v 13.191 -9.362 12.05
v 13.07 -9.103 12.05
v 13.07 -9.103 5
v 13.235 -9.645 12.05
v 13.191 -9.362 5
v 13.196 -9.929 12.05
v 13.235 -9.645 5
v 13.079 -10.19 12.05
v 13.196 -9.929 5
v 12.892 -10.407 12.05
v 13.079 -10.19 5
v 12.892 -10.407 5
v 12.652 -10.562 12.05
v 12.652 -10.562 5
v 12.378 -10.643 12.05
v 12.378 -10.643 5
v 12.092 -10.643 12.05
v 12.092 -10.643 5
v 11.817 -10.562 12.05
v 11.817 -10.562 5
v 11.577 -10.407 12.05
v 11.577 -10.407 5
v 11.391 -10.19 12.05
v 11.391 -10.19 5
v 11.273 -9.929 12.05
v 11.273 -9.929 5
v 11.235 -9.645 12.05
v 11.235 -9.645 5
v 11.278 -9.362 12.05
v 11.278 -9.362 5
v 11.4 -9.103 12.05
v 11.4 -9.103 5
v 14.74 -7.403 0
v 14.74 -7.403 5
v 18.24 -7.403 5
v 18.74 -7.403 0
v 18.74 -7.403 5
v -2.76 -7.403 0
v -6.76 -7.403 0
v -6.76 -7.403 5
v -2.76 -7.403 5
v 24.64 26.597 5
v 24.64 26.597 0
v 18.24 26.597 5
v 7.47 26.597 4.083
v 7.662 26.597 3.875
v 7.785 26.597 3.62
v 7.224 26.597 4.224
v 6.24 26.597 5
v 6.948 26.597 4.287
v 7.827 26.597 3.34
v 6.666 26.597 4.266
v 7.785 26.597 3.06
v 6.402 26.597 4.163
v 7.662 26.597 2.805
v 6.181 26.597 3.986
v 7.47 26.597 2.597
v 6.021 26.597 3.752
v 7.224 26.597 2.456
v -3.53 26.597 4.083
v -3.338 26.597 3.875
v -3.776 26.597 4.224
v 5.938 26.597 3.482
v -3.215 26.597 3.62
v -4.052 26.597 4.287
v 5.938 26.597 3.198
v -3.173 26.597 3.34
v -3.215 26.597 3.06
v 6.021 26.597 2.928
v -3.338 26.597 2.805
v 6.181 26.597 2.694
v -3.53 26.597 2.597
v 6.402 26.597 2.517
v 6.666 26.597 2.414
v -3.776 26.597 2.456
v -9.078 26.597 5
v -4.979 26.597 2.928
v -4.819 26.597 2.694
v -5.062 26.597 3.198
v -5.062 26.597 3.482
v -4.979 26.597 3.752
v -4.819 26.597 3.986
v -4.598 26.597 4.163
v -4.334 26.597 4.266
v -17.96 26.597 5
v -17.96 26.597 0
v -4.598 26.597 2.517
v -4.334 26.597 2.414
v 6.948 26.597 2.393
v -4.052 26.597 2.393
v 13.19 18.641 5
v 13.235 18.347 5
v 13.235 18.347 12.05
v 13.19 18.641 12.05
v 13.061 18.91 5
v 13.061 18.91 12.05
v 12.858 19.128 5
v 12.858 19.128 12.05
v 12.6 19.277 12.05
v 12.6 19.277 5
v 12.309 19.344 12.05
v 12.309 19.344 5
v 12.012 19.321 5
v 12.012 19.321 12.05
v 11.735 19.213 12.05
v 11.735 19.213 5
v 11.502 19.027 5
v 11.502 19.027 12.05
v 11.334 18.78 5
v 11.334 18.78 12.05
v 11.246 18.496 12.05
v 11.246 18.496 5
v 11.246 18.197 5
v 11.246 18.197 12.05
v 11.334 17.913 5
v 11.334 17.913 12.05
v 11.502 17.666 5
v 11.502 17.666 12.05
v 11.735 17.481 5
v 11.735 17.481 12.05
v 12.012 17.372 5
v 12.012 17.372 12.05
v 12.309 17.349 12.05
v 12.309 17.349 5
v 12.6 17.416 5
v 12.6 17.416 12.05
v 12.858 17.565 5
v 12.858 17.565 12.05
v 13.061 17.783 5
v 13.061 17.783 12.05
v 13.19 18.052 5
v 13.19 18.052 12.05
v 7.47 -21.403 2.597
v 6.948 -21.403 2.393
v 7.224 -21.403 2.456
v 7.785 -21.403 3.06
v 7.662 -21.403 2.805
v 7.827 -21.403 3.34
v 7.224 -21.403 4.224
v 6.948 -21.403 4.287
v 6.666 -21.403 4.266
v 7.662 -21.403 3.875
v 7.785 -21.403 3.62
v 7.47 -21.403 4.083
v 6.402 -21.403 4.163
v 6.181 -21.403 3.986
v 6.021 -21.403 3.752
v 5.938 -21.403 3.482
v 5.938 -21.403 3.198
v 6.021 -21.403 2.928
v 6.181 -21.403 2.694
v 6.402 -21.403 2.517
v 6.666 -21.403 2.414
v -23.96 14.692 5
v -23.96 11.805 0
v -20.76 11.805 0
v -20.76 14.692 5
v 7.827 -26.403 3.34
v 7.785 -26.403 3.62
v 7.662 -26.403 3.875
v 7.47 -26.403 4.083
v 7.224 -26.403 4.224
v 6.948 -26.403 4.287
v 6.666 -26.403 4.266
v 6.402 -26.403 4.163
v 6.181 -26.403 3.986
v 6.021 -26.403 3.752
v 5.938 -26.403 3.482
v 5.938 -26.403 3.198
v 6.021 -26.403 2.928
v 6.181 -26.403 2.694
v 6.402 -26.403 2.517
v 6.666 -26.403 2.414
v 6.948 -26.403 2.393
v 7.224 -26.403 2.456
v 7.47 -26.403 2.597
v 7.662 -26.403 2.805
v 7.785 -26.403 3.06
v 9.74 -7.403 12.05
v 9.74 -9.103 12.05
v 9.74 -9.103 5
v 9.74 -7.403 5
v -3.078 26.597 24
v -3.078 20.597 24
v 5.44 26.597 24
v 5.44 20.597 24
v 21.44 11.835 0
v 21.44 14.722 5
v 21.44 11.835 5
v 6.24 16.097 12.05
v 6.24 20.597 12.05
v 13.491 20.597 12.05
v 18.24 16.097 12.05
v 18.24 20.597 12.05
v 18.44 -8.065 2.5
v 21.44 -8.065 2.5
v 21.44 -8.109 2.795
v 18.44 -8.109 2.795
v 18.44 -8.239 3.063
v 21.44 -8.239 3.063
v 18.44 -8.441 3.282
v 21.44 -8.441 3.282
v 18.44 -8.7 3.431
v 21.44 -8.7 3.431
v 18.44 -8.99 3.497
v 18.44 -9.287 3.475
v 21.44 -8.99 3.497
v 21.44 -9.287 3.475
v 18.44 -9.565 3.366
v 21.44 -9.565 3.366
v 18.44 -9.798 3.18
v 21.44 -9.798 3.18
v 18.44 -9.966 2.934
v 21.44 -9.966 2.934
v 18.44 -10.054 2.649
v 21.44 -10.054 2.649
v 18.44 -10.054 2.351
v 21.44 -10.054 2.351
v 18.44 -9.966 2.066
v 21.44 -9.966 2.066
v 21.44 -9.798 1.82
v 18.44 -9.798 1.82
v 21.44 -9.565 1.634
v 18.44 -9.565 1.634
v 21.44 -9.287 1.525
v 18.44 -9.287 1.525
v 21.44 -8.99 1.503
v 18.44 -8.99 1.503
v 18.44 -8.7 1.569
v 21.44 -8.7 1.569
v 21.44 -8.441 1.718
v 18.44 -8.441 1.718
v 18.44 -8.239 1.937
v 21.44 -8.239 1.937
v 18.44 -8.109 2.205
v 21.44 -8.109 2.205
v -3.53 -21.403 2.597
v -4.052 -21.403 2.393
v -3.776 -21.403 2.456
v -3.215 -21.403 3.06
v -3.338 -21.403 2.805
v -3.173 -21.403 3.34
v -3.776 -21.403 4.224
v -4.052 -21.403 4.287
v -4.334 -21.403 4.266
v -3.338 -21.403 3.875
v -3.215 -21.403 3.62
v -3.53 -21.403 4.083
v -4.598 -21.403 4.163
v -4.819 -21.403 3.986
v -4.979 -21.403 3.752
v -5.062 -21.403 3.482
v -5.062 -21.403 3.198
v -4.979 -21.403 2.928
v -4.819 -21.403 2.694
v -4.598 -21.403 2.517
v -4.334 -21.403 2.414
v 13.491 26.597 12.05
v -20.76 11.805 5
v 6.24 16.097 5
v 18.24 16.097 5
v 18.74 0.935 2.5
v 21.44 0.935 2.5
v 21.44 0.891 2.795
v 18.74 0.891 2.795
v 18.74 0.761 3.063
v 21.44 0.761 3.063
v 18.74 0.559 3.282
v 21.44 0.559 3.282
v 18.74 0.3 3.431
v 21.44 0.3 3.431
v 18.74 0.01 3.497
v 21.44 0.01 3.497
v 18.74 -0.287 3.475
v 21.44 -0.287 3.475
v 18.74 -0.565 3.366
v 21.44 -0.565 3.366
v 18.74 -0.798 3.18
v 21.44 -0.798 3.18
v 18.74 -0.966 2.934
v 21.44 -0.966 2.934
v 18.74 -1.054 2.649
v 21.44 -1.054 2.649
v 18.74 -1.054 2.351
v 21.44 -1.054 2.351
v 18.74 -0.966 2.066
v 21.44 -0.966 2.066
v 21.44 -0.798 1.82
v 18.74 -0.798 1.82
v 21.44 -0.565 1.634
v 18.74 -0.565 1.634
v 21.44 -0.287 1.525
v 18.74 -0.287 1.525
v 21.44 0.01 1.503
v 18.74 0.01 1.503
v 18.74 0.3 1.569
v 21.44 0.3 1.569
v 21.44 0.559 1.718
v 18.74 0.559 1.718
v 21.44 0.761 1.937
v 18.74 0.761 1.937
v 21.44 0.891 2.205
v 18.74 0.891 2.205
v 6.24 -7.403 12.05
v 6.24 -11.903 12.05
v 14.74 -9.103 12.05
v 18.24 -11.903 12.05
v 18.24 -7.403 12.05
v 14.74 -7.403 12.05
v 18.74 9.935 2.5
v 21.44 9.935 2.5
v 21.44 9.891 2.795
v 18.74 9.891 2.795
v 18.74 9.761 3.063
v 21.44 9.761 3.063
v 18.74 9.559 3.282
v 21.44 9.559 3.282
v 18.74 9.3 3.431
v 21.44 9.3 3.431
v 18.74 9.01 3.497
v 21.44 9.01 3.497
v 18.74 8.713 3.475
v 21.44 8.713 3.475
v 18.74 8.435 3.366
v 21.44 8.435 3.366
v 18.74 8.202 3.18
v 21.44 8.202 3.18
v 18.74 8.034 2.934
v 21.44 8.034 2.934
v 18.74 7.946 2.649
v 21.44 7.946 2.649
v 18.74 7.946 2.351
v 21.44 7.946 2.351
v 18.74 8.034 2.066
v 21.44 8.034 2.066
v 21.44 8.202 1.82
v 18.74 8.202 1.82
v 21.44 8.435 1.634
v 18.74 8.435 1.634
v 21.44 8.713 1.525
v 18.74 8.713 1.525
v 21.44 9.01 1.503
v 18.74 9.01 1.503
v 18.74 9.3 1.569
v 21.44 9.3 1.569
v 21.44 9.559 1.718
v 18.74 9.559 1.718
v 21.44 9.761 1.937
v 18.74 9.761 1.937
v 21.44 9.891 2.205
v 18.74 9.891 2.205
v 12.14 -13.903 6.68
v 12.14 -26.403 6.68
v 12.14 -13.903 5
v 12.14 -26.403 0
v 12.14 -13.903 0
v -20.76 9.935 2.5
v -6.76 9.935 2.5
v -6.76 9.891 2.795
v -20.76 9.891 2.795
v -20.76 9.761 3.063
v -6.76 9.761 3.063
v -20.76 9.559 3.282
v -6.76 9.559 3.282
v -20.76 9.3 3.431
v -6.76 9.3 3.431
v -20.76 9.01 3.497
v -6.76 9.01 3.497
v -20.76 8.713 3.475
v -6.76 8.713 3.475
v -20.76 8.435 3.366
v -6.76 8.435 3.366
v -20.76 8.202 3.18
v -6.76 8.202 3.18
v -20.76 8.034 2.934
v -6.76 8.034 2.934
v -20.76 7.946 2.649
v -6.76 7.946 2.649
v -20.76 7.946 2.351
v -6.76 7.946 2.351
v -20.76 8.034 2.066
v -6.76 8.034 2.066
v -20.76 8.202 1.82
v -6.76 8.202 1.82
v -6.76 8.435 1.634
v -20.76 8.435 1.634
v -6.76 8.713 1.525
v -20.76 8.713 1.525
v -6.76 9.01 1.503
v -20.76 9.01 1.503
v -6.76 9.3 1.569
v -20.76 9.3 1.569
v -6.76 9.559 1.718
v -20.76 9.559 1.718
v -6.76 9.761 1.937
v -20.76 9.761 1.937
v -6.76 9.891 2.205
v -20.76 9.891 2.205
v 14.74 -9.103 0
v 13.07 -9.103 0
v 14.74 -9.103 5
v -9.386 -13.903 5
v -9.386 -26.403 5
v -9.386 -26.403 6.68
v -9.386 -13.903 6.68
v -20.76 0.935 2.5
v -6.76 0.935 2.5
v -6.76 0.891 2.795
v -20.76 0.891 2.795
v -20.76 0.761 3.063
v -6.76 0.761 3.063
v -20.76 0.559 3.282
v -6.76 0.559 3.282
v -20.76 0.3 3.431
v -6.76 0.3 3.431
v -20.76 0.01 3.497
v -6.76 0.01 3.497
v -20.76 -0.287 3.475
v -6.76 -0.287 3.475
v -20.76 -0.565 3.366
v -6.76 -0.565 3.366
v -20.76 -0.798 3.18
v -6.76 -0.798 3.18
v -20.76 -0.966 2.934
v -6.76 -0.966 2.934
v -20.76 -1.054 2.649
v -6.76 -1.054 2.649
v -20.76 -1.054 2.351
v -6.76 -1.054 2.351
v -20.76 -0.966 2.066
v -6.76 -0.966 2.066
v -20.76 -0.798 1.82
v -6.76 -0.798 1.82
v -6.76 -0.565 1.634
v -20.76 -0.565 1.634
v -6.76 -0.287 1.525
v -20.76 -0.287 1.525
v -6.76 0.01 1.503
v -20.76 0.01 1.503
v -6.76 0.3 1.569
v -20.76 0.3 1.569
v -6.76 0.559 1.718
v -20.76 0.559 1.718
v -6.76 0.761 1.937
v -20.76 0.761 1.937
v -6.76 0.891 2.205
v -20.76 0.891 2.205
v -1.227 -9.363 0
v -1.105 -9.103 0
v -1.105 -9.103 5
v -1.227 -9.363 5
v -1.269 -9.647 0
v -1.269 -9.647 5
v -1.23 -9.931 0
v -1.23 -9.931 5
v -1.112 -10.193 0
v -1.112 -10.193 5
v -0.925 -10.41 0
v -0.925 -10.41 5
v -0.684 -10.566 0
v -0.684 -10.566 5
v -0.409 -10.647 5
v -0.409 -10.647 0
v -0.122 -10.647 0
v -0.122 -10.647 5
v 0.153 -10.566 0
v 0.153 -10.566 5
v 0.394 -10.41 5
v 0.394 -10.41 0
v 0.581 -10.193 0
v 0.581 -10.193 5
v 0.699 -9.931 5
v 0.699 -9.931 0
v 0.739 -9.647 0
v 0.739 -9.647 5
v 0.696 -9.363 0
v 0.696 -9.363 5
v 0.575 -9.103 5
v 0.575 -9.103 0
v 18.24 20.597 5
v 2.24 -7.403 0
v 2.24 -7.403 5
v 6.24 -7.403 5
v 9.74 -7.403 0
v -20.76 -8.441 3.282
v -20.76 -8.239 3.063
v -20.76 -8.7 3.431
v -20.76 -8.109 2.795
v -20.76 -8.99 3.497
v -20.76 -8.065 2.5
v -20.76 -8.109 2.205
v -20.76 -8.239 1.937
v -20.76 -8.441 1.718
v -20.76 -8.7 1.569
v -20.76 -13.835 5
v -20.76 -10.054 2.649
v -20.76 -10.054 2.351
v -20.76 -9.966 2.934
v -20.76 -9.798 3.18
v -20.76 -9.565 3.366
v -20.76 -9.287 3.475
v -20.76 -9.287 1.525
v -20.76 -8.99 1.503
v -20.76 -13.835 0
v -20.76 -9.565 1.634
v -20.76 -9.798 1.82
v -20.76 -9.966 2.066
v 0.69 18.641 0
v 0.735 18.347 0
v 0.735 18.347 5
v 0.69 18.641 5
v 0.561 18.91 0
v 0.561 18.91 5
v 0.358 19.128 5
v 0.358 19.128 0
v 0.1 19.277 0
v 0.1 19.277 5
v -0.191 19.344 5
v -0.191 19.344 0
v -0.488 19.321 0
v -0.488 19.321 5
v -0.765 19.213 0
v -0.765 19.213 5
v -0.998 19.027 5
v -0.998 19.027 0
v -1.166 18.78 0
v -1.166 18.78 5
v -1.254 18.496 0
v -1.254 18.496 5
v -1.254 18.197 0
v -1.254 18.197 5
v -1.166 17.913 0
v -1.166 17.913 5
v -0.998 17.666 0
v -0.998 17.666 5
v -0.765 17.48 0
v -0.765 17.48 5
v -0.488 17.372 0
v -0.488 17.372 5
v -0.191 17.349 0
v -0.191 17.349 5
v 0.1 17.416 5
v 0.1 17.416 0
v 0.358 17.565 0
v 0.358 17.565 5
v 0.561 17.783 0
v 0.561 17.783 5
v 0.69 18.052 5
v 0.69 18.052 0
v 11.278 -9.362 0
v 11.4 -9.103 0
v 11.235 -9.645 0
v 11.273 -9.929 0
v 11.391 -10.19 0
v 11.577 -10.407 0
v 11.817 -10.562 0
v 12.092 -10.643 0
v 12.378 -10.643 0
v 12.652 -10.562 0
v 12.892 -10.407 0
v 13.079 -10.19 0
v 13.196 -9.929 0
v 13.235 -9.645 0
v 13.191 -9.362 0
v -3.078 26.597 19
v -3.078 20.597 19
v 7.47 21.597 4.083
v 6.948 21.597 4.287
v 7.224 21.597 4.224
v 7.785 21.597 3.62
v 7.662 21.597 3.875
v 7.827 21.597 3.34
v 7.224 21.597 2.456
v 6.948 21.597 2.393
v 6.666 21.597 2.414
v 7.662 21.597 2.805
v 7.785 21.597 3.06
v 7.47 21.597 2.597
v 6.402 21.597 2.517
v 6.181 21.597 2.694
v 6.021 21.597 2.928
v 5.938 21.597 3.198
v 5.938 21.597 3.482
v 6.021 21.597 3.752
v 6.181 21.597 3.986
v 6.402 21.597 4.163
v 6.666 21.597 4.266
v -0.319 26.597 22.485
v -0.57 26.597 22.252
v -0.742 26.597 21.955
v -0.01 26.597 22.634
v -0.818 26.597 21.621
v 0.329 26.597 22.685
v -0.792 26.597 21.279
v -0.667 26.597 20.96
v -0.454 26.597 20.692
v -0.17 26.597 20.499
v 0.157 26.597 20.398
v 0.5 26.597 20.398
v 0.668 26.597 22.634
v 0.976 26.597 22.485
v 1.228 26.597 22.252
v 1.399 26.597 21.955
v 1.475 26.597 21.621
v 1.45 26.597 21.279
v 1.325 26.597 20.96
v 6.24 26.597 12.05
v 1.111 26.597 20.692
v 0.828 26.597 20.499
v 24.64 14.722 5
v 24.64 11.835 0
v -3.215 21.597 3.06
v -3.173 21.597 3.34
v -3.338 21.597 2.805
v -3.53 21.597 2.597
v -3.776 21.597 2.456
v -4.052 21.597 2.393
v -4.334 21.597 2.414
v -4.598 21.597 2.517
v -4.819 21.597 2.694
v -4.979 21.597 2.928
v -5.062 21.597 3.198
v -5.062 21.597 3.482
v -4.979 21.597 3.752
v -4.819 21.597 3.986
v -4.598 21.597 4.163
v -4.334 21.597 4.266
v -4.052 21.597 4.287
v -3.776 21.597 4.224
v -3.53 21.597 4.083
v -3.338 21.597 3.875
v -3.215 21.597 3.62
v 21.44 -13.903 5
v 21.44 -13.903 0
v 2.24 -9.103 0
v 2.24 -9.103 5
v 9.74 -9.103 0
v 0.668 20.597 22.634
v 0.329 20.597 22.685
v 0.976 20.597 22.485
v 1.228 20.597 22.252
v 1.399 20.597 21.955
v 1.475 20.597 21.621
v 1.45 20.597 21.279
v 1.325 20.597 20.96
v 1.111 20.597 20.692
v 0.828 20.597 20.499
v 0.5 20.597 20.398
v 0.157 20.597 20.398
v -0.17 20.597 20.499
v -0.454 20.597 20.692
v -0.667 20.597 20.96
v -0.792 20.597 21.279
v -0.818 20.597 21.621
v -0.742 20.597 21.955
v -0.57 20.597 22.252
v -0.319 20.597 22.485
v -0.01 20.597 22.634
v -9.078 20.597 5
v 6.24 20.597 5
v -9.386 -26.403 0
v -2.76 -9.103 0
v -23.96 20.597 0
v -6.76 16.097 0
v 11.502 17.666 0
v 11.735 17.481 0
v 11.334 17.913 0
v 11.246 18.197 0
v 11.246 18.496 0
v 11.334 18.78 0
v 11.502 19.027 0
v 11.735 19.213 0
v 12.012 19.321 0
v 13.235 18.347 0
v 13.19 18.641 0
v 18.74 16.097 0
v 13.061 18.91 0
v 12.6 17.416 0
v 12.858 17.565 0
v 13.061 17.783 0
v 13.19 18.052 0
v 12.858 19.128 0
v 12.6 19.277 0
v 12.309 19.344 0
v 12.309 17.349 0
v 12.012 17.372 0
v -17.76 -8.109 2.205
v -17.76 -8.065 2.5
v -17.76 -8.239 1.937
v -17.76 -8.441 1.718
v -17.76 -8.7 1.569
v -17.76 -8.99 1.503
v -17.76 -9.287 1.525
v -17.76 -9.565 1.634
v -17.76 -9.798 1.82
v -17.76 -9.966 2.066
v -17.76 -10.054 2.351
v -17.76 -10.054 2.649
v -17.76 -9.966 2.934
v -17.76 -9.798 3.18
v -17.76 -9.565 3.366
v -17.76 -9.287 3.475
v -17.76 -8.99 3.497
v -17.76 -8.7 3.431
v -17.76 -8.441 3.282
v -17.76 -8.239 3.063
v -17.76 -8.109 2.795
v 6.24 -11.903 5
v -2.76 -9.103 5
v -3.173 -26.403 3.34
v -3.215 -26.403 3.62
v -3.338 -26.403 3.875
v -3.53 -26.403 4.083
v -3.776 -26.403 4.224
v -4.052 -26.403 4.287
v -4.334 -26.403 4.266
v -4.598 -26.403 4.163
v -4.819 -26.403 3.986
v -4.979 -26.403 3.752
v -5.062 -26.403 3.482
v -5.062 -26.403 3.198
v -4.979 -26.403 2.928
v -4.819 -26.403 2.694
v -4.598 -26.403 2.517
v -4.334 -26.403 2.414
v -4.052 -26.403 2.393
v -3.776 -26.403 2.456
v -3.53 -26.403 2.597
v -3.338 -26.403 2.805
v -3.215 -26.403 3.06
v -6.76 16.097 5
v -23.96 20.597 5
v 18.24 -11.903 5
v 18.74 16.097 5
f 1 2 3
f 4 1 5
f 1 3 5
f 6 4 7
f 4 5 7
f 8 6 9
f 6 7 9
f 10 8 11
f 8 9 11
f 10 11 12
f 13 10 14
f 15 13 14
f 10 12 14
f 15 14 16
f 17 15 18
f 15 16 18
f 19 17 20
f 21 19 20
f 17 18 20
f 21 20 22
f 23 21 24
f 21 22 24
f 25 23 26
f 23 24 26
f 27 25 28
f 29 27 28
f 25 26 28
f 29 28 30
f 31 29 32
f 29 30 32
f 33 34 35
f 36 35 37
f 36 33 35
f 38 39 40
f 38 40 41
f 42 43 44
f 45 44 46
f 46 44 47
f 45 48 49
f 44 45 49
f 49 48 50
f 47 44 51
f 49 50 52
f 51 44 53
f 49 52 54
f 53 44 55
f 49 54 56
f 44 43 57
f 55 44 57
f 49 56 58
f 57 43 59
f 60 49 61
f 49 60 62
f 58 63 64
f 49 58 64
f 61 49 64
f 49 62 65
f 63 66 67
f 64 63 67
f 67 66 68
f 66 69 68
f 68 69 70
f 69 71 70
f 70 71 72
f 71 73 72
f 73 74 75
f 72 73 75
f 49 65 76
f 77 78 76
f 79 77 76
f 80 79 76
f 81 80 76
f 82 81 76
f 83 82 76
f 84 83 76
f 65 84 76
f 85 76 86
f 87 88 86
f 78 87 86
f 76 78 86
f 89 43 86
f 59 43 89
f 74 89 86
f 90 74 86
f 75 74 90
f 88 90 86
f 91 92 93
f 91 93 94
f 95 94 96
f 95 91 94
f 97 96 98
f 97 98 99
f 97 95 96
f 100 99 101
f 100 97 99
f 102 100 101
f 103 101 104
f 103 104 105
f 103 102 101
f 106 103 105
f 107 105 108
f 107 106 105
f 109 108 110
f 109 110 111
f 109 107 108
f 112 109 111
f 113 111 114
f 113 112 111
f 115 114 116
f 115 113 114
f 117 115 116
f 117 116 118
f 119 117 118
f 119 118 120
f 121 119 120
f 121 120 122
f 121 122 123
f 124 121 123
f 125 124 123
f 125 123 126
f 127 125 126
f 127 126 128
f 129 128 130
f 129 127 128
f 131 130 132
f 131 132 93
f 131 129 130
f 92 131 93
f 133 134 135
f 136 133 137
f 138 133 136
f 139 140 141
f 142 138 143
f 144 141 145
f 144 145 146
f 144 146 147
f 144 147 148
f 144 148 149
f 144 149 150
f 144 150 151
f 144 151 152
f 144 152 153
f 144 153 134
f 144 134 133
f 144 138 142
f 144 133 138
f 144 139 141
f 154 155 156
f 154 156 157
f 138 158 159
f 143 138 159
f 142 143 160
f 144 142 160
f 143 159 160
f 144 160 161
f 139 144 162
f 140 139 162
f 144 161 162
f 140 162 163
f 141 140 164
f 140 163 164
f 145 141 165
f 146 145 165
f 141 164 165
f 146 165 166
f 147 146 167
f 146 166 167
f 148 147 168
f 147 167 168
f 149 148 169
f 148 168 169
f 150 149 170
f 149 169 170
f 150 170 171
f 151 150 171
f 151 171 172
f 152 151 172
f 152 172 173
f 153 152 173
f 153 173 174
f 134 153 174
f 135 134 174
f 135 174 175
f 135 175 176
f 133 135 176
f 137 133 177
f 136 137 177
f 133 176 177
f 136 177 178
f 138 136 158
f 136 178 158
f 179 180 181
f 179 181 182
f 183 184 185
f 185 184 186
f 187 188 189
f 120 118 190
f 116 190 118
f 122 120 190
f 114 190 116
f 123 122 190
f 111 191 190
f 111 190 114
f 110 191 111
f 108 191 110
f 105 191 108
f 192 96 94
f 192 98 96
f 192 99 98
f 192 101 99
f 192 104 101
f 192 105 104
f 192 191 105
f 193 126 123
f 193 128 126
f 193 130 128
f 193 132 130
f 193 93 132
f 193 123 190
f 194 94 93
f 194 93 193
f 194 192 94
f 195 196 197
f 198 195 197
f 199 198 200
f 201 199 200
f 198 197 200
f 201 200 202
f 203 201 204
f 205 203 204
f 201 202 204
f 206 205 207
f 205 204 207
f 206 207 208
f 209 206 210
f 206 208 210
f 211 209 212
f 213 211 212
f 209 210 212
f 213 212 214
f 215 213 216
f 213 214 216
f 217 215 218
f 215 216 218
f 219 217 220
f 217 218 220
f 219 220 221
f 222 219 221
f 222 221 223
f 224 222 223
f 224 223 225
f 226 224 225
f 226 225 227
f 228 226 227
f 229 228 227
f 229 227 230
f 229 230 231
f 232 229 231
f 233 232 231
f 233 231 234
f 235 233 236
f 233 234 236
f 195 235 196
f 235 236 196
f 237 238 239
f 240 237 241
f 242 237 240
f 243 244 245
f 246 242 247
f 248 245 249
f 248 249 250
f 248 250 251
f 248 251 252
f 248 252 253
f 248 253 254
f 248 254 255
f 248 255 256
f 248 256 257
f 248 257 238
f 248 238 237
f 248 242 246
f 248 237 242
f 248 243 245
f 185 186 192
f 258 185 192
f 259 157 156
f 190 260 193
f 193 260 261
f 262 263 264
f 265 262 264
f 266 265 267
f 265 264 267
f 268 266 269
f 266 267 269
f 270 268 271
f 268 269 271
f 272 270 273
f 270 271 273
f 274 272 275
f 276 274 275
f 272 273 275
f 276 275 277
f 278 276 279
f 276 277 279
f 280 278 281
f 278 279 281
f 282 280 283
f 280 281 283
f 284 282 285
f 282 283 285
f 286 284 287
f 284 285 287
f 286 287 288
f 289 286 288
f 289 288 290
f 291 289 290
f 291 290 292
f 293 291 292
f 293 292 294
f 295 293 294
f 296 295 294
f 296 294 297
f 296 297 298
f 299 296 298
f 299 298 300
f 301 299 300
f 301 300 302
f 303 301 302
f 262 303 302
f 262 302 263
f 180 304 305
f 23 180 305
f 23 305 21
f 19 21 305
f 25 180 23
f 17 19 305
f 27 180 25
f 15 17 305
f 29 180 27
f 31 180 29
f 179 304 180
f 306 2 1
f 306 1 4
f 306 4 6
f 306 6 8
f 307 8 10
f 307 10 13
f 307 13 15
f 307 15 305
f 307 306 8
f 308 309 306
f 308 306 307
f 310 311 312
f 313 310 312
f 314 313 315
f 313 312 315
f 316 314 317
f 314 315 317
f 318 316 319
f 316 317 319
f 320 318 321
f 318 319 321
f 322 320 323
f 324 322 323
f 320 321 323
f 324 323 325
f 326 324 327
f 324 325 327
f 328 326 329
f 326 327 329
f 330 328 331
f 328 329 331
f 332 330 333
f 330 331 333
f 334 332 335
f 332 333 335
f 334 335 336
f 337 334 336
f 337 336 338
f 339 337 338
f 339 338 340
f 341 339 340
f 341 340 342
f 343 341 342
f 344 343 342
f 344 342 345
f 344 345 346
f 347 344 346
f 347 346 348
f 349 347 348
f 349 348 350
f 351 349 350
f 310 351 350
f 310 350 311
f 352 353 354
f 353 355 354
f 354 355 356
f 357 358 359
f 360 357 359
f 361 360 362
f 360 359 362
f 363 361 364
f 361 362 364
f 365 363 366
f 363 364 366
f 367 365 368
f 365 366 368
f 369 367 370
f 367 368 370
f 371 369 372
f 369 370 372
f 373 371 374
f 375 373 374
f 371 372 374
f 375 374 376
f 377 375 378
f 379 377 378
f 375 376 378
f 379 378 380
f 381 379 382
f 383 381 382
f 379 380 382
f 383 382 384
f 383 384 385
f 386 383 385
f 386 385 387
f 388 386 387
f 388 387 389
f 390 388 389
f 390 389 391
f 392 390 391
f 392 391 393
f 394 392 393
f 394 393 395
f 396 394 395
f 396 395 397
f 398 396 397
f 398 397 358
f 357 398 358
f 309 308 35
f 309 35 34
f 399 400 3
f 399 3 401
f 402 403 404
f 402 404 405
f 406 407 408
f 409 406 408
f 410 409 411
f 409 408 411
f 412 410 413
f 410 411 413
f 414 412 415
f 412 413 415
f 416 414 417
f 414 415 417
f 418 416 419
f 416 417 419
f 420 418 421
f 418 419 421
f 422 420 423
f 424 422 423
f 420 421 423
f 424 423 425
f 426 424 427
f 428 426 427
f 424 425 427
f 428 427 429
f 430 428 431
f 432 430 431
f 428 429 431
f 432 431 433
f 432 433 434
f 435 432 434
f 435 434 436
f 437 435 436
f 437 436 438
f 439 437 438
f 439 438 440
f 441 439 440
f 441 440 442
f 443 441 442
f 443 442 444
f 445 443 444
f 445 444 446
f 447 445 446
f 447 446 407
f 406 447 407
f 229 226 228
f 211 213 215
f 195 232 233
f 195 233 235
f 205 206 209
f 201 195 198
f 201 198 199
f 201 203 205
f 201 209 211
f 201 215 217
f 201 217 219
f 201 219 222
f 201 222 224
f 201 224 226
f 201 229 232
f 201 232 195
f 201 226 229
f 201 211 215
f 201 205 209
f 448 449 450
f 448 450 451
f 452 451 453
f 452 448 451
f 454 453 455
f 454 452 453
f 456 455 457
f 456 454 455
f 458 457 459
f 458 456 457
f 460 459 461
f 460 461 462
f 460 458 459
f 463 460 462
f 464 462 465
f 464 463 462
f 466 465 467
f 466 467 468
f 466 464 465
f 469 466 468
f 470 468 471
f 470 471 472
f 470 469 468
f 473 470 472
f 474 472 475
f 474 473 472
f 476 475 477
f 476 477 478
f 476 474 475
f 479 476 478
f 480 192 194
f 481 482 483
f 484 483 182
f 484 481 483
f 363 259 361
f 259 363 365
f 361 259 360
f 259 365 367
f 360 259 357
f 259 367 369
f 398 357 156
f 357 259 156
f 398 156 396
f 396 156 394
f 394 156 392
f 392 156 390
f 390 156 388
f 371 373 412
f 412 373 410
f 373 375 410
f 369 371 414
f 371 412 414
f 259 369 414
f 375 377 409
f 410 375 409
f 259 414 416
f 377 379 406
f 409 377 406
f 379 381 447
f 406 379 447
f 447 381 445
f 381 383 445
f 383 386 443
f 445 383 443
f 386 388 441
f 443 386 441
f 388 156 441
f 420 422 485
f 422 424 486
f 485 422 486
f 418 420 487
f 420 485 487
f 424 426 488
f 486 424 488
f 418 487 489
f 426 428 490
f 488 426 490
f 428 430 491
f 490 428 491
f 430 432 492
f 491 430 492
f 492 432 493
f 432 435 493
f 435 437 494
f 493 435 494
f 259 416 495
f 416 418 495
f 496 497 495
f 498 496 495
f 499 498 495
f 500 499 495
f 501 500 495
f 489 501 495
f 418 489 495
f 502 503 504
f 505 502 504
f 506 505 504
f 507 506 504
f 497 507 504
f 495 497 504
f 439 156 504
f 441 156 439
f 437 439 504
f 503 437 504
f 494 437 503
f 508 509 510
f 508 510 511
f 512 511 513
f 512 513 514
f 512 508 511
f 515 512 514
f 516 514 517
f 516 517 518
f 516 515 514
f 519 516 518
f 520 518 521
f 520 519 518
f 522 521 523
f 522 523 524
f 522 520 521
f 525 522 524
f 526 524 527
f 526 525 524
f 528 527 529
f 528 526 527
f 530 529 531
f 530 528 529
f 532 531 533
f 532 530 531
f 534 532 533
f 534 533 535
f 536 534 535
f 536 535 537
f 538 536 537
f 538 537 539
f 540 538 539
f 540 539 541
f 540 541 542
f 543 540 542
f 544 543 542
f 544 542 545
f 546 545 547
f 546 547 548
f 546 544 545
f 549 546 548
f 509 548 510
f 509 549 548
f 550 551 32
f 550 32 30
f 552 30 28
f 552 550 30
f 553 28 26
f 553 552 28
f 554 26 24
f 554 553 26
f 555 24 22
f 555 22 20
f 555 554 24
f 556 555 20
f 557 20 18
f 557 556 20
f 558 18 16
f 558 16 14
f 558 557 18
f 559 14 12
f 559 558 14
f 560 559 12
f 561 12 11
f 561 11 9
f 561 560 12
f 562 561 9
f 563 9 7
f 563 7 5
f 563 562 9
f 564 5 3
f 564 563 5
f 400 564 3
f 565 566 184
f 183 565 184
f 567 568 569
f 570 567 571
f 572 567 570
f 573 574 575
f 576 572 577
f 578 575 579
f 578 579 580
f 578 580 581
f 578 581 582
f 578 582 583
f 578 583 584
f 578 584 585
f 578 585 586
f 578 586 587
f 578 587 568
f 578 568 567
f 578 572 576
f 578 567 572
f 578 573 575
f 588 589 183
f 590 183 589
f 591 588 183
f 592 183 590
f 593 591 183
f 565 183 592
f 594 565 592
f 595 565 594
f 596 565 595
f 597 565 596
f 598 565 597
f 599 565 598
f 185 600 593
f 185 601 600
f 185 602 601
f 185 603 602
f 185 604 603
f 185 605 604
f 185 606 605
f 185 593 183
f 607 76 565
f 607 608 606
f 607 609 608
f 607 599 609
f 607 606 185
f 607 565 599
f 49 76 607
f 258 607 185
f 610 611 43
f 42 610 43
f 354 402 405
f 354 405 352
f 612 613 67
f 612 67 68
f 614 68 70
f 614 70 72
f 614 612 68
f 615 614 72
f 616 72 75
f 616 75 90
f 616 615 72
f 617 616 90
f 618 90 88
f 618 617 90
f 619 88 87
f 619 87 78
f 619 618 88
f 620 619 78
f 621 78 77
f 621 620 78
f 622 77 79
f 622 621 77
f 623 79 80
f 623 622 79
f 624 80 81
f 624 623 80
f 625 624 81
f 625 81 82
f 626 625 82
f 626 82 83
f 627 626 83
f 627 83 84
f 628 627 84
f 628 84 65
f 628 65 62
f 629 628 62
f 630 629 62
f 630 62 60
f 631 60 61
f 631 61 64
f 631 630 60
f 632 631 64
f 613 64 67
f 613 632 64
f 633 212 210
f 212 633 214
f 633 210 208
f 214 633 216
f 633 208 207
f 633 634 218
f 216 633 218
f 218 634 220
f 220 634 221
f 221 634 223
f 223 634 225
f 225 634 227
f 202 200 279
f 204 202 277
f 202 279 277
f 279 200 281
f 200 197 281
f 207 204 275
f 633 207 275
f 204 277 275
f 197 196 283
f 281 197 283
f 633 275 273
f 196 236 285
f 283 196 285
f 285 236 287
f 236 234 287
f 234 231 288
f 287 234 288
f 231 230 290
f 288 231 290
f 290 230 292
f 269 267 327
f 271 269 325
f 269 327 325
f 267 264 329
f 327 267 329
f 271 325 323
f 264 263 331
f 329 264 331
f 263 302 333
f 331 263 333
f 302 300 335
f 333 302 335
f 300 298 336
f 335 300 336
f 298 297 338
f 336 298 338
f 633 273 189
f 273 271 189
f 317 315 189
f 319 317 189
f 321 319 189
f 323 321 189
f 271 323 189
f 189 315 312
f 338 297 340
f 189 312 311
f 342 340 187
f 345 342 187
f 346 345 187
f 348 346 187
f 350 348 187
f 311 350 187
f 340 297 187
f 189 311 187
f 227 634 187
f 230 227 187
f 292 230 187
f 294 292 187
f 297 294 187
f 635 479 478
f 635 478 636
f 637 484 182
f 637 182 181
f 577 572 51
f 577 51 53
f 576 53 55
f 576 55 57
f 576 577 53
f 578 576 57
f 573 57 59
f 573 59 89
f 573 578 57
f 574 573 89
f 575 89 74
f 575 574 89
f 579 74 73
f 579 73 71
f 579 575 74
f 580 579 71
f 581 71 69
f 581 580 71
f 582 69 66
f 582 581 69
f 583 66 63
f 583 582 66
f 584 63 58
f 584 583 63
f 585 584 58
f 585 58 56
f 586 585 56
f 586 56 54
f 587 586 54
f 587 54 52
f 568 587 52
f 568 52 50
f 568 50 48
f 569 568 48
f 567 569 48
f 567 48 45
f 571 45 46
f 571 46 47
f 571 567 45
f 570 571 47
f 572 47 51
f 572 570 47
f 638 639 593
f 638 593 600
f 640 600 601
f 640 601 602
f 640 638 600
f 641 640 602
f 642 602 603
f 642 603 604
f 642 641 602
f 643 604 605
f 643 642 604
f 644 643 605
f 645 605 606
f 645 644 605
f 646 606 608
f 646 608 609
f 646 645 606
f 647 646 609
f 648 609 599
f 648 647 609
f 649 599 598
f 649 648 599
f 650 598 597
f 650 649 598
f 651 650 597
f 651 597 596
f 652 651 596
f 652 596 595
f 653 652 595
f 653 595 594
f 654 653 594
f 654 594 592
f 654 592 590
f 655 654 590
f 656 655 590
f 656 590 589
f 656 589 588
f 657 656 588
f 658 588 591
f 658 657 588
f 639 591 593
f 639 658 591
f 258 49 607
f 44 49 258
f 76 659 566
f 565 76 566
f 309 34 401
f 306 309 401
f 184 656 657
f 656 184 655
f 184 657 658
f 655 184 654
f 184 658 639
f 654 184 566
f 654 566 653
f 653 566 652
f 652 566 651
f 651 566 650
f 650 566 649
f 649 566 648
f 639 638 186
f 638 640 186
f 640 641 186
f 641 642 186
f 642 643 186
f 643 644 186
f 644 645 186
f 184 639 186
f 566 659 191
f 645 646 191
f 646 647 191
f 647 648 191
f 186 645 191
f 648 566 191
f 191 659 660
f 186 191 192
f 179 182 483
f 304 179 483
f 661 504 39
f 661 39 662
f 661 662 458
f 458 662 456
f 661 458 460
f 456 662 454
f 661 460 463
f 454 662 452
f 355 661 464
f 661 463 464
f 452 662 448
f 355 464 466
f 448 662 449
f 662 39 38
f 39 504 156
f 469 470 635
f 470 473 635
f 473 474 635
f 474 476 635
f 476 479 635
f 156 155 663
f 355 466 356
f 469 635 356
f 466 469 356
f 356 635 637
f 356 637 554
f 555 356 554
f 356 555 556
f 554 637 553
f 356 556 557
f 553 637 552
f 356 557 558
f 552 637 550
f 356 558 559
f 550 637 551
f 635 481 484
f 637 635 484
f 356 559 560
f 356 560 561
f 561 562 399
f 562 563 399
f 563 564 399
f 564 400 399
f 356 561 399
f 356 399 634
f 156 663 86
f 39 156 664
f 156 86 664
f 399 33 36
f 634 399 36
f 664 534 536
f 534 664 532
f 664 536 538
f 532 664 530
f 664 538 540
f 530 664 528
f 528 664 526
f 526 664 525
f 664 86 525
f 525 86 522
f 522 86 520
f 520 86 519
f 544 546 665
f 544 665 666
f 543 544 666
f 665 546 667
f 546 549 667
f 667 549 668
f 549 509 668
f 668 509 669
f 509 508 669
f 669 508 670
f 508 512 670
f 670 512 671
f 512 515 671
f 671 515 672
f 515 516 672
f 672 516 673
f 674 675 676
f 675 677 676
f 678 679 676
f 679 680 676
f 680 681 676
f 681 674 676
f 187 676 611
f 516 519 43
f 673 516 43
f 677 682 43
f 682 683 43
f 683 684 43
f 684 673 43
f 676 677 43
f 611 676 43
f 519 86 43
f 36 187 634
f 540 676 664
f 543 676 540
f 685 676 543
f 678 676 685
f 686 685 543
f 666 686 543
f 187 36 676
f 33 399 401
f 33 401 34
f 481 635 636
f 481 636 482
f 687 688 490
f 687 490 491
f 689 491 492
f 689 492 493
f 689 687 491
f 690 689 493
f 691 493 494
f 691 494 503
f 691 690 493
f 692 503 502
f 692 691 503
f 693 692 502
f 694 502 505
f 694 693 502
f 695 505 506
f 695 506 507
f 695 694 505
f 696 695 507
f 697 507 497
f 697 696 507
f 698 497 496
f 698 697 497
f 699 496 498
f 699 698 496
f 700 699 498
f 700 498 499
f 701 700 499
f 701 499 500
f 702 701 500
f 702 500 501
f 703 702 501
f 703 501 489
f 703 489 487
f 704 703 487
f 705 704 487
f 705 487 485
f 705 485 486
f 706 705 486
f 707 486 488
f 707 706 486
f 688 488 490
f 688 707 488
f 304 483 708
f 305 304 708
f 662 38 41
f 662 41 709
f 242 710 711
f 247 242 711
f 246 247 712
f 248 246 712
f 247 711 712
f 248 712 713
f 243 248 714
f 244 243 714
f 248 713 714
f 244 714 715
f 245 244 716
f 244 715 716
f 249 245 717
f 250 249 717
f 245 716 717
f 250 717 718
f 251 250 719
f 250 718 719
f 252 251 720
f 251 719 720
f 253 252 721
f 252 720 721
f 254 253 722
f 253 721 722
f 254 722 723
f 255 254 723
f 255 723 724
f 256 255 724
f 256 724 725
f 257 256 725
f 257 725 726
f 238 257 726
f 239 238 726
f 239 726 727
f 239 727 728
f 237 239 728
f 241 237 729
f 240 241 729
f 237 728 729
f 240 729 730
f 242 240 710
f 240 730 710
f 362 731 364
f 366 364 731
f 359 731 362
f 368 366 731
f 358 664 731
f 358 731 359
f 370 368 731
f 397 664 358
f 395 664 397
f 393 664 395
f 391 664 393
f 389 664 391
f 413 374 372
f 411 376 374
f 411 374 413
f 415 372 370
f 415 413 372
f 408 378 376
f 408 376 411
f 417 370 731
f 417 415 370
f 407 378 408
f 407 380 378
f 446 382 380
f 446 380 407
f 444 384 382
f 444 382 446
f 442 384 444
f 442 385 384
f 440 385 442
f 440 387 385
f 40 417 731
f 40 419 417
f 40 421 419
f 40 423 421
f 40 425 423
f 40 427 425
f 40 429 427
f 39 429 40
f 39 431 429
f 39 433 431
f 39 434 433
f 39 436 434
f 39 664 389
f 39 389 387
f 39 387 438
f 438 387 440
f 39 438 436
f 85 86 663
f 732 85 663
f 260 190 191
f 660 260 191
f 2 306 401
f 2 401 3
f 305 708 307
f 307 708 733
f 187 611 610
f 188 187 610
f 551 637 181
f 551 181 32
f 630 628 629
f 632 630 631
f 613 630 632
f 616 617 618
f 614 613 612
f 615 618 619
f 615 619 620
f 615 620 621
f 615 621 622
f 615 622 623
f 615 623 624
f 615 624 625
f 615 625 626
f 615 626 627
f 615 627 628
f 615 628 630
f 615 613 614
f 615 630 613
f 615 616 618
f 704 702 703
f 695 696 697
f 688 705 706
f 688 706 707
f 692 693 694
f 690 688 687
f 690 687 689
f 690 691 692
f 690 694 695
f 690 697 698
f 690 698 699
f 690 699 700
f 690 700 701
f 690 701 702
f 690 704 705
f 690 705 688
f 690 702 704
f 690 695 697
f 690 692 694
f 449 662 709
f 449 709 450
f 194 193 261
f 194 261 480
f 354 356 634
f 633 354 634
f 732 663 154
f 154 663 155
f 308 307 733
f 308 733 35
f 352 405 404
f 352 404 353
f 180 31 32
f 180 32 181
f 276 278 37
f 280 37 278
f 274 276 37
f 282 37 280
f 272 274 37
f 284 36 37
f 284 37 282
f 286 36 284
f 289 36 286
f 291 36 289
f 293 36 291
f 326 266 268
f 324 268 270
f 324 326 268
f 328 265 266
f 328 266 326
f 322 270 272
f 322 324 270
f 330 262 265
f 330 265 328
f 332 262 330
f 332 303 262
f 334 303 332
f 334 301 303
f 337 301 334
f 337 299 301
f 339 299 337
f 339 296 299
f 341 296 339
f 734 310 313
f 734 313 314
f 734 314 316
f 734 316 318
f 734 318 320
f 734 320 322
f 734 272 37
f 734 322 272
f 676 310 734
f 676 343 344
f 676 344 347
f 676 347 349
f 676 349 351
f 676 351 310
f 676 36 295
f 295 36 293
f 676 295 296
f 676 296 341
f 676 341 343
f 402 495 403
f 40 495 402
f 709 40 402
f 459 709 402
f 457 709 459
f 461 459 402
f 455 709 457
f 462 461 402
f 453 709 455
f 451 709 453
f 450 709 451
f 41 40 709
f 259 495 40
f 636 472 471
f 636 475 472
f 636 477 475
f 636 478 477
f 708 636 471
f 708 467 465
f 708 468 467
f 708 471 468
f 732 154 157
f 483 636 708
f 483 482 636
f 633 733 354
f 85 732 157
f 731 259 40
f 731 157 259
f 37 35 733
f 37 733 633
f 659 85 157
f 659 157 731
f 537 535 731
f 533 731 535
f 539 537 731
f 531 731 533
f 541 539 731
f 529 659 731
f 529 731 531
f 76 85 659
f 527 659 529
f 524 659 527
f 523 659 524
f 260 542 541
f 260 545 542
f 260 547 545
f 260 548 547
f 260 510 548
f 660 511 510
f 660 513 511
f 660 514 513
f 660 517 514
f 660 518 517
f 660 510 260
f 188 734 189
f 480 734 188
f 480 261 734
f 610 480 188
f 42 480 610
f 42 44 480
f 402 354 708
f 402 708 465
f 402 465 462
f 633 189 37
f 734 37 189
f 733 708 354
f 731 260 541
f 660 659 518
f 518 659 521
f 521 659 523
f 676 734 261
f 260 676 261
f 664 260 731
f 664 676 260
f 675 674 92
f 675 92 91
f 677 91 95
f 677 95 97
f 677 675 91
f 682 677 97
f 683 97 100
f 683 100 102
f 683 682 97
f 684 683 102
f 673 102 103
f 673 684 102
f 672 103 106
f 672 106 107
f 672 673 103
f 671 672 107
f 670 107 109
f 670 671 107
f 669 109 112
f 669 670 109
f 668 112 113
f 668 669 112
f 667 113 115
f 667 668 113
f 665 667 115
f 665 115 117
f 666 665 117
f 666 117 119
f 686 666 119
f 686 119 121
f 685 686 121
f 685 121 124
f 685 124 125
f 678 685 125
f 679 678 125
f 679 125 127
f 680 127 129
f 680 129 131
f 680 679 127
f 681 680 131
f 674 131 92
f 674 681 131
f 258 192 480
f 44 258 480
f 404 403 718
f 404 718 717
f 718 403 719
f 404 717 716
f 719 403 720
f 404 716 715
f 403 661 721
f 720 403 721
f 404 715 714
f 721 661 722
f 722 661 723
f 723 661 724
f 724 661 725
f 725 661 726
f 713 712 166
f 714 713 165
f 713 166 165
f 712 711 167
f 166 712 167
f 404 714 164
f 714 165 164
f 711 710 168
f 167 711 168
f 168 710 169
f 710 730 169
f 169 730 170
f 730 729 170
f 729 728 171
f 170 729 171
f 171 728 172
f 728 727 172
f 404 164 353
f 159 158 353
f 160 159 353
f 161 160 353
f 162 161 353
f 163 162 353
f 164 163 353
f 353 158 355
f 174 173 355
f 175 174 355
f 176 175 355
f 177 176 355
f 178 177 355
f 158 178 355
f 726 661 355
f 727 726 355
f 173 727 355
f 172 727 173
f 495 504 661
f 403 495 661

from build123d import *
from build123d.topology import SkipClean

# Parameters (mm, degrees)
SKETCH_1_R          = 1.000029699
SKETCH_1_R_2        = 1.000000092
EXTRUDE_1_DEPTH     = 5
SKETCH_2_W          = 21.526040124
SKETCH_2_H          = 12.5
EXTRUDE_2_DEPTH     = 1.68
SKETCH_3_R          = 0.95
CUT_EXTRUDE_1_DEPTH = 5
SKETCH_4_W          = 12
SKETCH_4_H          = 4.5
SKETCH_4_R          = 1.000000092
EXTRUDE_3_DEPTH     = 7.05
SKETCH_5_R          = 1.149999977
EXTRUDE_4_DEPTH     = 6
CUT_EXTRUDE_START   = -5
SKETCH_6_R          = 0.95
CUT_EXTRUDE_2_DEPTH = 5
SKETCH_7_R          = 1
CUT_EXTRUDE_3_DEPTH = 100
SKETCH_8_R          = 1
CUT_EXTRUDE_4_DEPTH = 3
CUT_EXTRUDE_START_2 = -3
SKETCH_9_R          = 1
CUT_EXTRUDE_5_DEPTH = 3
CUT_EXTRUDE_6_DEPTH = 3.2
CUT_EXTRUDE_7_DEPTH = 3.2


with BuildPart() as part:
    # 草图1 → 凸台-拉伸1 (new body)
    with BuildSketch(Plane.XY):
        Polygon((21.440408464, 11.835070794), (24.640408464, 11.835070794), (24.640408464, 26.596532095), (-17.959592209, 26.596532095), (-23.959592393, 20.596531911), (-23.959592393, 11.805155949), (-20.759591536, 11.805155949), (-20.759591536, -13.834684697), (-9.38563166, -26.403467905), (12.140408464, -26.403467905), (12.140408464, -13.903467905), (21.440408464, -13.903467905), align=None)
        with Locations((-0.265302528, 18.346532095)):
            Circle(SKETCH_1_R, mode=Mode.SUBTRACT)
        with Locations((12.234697472, 18.346532095)):
            Circle(SKETCH_1_R_2, mode=Mode.SUBTRACT)
        with BuildLine():
            ThreePointArc((11.399532521, -9.103467905), (12.234697472, -10.653468153), (13.069862423, -9.103467905))
            Line((13.069862423, -9.103467905), (14.740408464, -9.103467905))
            Line((14.740408464, -9.103467905), (14.740408464, -7.403467905))
            Line((14.740408464, -7.403467905), (18.740408464, -7.403467905))
            Line((18.740408464, -7.403467905), (18.740408464, 16.096532095))
            Line((18.740408464, 16.096532095), (-6.759591536, 16.096532095))
            Line((-6.759591536, 16.096532095), (-6.759591536, -7.403467905))
            Line((-6.759591536, -7.403467905), (-2.759591536, -7.403467905))
            Line((-2.759591536, -7.403467905), (-2.759591536, -9.103467905))
            Line((-2.759591536, -9.103467905), (-1.105259185, -9.103467905))
            ThreePointArc((-1.105259185, -9.103467905), (-0.265302528, -10.657473475), (0.574654129, -9.103467905))
            Line((0.574654129, -9.103467905), (2.240408464, -9.103467905))
            Line((2.240408464, -9.103467905), (2.240408464, -7.403467905))
            Line((2.240408464, -7.403467905), (9.740408464, -7.403467905))
            Line((9.740408464, -7.403467905), (9.740408464, -9.103467905))
            Line((9.740408464, -9.103467905), (11.399532521, -9.103467905))
        make_face(mode=Mode.SUBTRACT)
    extrude(amount=EXTRUDE_1_DEPTH)

    # 草图2 → 凸台-拉伸2 (add)
    with BuildSketch(Plane.XY.offset(5)):
        with Locations((1.377388402, -20.153467905)):
            Rectangle(SKETCH_2_W, SKETCH_2_H)
    extrude(amount=EXTRUDE_2_DEPTH)

    # 草图3 → 切除-拉伸1 (cut)
    with BuildSketch(Plane.XZ.offset(26.403467905)):
        with Locations((-4.122611598, 3.34)):
            Circle(SKETCH_3_R)
        with Locations((6.877388402, 3.34)):
            Circle(SKETCH_3_R)
    extrude(amount=-CUT_EXTRUDE_1_DEPTH, mode=Mode.SUBTRACT)

    # 草图4 → 凸台-拉伸3 (add)
    # profile 1 of 2: a face of its own
    with SkipClean():  # the faces are left unmerged after this step: merging them gives an invalid solid
        with BuildSketch(Plane.XY.offset(5)):
            with BuildLine():
                Line((6.240408464, -7.403467905), (6.240408464, -11.903467905))
                Line((6.240408464, -11.903467905), (18.240408464, -11.903467905))
                Line((18.240408464, -11.903467905), (18.240408464, -7.403467905))
                Line((18.240408464, -7.403467905), (14.740408464, -7.403467905))
                Line((14.740408464, -7.403467905), (14.740408464, -9.103467905))
                Line((14.740408464, -9.103467905), (13.069862423, -9.103467905))
                ThreePointArc((13.069862423, -9.103467905), (12.234697472, -10.653468153), (11.399532521, -9.103467905))
                Line((11.399532521, -9.103467905), (9.740408464, -9.103467905))
                Line((9.740408464, -9.103467905), (9.740408464, -7.403467905))
                Line((9.740408464, -7.403467905), (6.240408464, -7.403467905))
            make_face()
        # profile 2 of 2: a face of its own
        with BuildSketch(Plane.XY.offset(5)):
            with Locations((12.240408464, 18.346532095)):
                Rectangle(SKETCH_4_W, SKETCH_4_H)
            with Locations((12.234697472, 18.346532095)):
                Circle(SKETCH_4_R, mode=Mode.SUBTRACT)
        extrude(amount=EXTRUDE_3_DEPTH)

    # 草图5 → 凸台-拉伸4 (add)
    # profile 1 of 2: a face of its own
    with SkipClean():  # the faces are left unmerged after this step: merging them gives an invalid solid
        with BuildSketch(Plane(origin=(0, 20.596532095, 0), x_dir=(1, 0, 0), z_dir=(0, 1, 0))):
            Polygon((-9.07755609, -5), (-3.077555613, -18.999999523), (-3.077555613, -23.999999285), (5.440409227, -23.999999285), (13.490934884, -12.05), (6.240408464, -12.05), (6.240408464, -5), align=None)
            with Locations(Location((0.328667587, -21.535050638, 0), (0, 0, 270))):
                Circle(SKETCH_5_R, mode=Mode.SUBTRACT)
        # profile 2 of 2: a face of its own
        with BuildSketch(Plane(origin=(0, 20.596532095, 0), x_dir=(1, 0, 0), z_dir=(0, 1, 0))):
            Polygon((18.240408464, -5), (6.240408464, -5), (6.240408464, -12.05), (13.490934884, -12.05), align=None)
        extrude(amount=EXTRUDE_4_DEPTH)

    # 草图6 → 切除-拉伸2 (cut)
    with SkipClean():  # the faces are left unmerged after this step: merging them gives an invalid solid
        with BuildSketch(Plane(origin=(0, 26.596532095, 0), x_dir=(1, 0, 0), z_dir=(0, 1, 0)).offset(CUT_EXTRUDE_START)):
            with Locations((-4.122611598, -3.34)):
                Circle(SKETCH_6_R)
            with Locations((6.877388402, -3.34)):
                Circle(SKETCH_6_R)
        extrude(amount=CUT_EXTRUDE_2_DEPTH, mode=Mode.SUBTRACT)

    # 草图7 → 切除-拉伸3 (cut)
    with SkipClean():  # the faces are left unmerged after this step: merging them gives an invalid solid
        with BuildSketch(Plane(origin=(21.440408464, 0, 0), x_dir=(0, 0, -1), z_dir=(1, 0, 0))):
            with Locations(Location((-2.5, 8.935070794, 0), (0, 0, 90))):
                Circle(SKETCH_7_R)
            with Locations(Location((-2.5, -0.064929206, 0), (0, 0, 90))):
                Circle(SKETCH_7_R)
        extrude(amount=-CUT_EXTRUDE_3_DEPTH, mode=Mode.SUBTRACT)

    # 草图8 → 切除-拉伸4 (cut)
    with SkipClean():  # the faces are left unmerged after this step: merging them gives an invalid solid
        with BuildSketch(Plane(origin=(21.440408464, 0, 0), x_dir=(0, 0, -1), z_dir=(1, 0, 0))):
            with Locations(Location((-2.5, -9.064929206, 0), (0, 0, 90))):
                Circle(SKETCH_8_R)
        extrude(amount=-CUT_EXTRUDE_4_DEPTH, mode=Mode.SUBTRACT)

    # 草图9 → 切除-拉伸5 (cut)
    with SkipClean():  # the faces are left unmerged after this step: merging them gives an invalid solid
        with BuildSketch(Plane.ZY.offset(20.759591536).offset(CUT_EXTRUDE_START_2)):
            with Locations(Location((2.5, -9.064929206, 0), (0, 0, 90))):
                Circle(SKETCH_9_R)
        extrude(amount=CUT_EXTRUDE_5_DEPTH, mode=Mode.SUBTRACT)

    # 草图10 → 切除-拉伸6 (cut)
    with SkipClean():  # the faces are left unmerged after this step: merging them gives an invalid solid
        with BuildSketch(Plane.ZY.offset(23.959592393)):
            Polygon((5, 11.805155949), (0, 11.805155949), (5, 14.691907295), align=None)
        extrude(amount=-CUT_EXTRUDE_6_DEPTH, mode=Mode.SUBTRACT)

    # 草图11 → 切除-拉伸7 (cut)
    with SkipClean():  # the faces are left unmerged after this step: merging them gives an invalid solid
        with BuildSketch(Plane(origin=(24.640408464, 0, 0), x_dir=(0, 0, -1), z_dir=(1, 0, 0))):
            Polygon((0, 11.835070794), (-5, 14.72182214), (-5, 11.835070794), align=None)
        extrude(amount=-CUT_EXTRUDE_7_DEPTH, mode=Mode.SUBTRACT)


solid = part.part
